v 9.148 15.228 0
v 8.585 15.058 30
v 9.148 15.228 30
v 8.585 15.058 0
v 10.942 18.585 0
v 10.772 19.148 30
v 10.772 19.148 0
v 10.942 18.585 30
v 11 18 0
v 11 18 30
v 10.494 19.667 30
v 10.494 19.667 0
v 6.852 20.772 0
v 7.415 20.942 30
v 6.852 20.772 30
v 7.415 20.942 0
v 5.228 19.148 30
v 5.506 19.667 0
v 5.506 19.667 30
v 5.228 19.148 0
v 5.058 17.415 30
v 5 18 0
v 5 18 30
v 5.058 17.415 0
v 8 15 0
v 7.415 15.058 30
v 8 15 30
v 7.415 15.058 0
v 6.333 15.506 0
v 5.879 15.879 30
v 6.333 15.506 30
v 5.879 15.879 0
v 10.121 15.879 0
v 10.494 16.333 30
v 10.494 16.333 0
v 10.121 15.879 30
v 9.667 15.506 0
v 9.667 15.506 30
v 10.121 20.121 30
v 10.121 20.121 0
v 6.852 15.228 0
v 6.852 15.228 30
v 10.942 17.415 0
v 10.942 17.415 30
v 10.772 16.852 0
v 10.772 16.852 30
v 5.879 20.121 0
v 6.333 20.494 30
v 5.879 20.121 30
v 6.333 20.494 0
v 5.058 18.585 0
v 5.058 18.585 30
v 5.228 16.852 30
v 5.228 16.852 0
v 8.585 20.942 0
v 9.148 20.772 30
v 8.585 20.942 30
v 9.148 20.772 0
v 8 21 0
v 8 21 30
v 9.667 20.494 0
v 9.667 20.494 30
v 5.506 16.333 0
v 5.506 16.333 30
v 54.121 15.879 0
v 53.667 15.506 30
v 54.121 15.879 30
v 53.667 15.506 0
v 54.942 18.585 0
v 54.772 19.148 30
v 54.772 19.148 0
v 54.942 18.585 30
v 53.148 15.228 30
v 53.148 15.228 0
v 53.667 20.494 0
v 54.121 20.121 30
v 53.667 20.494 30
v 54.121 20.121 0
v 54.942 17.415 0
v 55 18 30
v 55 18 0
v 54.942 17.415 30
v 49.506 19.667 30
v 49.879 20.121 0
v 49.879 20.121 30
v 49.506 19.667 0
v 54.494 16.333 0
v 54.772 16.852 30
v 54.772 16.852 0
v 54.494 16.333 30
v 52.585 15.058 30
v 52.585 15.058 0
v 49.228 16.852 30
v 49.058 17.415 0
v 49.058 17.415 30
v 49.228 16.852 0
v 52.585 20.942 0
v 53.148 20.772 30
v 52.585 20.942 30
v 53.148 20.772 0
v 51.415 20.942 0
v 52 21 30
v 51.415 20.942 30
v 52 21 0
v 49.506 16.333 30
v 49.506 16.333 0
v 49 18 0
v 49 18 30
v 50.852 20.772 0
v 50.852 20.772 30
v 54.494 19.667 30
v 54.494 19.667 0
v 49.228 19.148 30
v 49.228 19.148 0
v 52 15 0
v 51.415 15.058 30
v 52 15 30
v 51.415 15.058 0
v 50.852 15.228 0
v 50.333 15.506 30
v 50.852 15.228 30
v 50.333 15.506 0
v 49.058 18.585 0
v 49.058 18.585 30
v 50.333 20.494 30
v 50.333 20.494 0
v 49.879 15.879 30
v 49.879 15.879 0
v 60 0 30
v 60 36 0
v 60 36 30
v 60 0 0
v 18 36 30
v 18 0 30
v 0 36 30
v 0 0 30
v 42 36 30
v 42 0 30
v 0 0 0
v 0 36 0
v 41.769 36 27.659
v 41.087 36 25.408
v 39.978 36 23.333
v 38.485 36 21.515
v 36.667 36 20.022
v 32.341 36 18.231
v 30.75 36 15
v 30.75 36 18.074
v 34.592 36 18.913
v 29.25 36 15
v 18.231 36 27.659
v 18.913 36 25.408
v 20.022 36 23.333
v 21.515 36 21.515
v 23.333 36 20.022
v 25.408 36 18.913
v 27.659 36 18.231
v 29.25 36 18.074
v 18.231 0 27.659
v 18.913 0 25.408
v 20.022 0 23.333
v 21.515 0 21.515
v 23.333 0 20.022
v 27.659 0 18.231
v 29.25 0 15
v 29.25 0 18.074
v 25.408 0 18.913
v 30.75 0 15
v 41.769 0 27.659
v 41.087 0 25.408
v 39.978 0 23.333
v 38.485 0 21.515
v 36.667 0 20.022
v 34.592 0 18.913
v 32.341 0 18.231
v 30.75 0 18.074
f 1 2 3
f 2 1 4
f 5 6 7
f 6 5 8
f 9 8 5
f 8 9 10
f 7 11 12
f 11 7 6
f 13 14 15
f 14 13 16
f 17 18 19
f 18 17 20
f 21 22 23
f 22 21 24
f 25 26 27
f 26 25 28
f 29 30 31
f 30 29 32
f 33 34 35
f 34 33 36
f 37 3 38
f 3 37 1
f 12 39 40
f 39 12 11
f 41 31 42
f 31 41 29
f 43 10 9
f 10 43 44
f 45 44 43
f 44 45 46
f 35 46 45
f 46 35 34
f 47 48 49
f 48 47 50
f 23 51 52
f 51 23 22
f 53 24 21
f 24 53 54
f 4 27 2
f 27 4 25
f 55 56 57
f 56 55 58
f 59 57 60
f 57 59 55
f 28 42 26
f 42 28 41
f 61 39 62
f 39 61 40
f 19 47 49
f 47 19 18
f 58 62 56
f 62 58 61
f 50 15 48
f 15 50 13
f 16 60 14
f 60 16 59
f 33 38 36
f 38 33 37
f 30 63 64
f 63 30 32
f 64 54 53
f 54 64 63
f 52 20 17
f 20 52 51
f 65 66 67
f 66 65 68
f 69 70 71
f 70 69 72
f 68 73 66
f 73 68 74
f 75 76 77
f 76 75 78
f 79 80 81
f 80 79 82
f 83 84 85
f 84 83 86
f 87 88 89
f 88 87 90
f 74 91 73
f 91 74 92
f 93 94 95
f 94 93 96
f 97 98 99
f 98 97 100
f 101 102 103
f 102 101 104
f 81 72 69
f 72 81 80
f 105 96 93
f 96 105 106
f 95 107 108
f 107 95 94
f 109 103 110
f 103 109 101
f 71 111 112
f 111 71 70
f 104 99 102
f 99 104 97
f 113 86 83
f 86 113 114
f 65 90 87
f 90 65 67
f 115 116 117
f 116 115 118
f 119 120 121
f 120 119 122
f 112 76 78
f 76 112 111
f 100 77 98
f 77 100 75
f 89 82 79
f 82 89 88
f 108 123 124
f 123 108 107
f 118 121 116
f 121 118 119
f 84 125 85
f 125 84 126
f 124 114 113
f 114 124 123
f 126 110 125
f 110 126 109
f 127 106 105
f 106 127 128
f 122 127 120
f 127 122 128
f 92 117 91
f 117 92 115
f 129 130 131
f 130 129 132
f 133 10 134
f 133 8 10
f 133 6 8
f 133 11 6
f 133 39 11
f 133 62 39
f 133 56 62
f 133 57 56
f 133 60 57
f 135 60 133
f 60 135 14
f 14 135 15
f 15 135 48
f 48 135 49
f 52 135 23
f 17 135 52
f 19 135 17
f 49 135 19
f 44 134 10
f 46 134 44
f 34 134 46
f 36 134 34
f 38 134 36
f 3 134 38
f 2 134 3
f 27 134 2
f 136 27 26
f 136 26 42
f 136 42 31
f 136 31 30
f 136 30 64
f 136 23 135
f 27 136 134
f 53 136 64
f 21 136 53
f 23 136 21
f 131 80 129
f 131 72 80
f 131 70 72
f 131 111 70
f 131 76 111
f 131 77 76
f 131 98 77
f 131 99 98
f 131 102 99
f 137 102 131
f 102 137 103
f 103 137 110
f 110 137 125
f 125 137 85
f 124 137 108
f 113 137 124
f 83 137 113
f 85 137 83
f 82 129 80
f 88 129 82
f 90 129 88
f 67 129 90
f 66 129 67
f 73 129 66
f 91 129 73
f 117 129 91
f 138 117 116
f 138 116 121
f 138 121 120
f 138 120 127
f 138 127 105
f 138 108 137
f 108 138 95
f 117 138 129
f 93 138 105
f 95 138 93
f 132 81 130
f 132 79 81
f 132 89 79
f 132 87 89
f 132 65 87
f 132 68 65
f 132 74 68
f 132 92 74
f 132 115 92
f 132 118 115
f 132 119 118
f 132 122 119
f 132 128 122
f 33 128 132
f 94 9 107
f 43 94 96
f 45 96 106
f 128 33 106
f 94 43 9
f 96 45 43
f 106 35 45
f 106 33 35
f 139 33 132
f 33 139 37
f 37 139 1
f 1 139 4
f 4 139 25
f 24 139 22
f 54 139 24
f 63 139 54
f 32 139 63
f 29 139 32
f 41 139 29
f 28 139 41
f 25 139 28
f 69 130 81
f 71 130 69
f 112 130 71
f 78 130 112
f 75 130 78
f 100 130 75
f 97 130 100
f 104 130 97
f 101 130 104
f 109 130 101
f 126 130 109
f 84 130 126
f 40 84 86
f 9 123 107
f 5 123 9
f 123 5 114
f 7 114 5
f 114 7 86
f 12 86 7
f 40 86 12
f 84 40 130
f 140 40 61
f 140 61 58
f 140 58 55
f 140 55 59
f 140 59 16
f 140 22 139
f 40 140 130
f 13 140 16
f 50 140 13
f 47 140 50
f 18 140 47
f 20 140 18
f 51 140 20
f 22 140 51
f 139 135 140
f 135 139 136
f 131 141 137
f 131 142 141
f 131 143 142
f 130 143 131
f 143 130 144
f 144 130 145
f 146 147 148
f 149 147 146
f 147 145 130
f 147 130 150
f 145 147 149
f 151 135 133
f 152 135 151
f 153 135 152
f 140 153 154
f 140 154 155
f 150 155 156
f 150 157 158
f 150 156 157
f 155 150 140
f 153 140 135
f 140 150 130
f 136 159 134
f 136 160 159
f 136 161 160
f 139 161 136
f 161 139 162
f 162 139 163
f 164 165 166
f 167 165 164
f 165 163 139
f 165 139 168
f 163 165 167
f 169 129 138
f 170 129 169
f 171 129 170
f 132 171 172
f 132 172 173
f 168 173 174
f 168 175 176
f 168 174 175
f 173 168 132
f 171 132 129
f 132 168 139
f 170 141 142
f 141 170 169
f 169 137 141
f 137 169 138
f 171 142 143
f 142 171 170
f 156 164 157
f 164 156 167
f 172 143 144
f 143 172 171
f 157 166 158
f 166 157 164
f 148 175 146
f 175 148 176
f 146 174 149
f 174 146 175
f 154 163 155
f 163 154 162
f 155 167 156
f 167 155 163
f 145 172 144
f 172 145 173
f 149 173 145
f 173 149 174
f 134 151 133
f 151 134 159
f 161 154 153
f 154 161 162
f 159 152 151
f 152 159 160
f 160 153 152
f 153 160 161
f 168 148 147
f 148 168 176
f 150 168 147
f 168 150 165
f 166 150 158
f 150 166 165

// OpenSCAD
$fn = 32;

// ----------------------------------------------------------------------
// Saddle clamp: split shaft clamp
// ----------------------------------------------------------------------

// --- parameters (mm) ---
blk_l = 60;               // block length, X
blk_w = 36;               // block width, Y
blk_h = 30;               // block height
clamp_r = 12;             // shaft groove radius
hole_r = 3;               // bolt hole radius
hole_m = 8;               // bolt hole margin from the ends
saw_w = 1.5;              // saw kerf width

saw_depth = clamp_r + 3;  // saw kerf depth

difference() {
  cube([blk_l, blk_w, blk_h]);
  translate([blk_l / 2, -1, blk_h])
    rotate([-90, 0, 0])
      cylinder(h = blk_w + 2, r = clamp_r);
  for (sx = [0, 1])
    translate([sx ? blk_l - hole_m : hole_m, blk_w / 2, -1])
      cylinder(r = hole_r, h = blk_h + 2);
  translate([blk_l / 2 - saw_w / 2, -1, blk_h - saw_depth])
    cube([saw_w, blk_w + 2, saw_depth + 1]);
}
